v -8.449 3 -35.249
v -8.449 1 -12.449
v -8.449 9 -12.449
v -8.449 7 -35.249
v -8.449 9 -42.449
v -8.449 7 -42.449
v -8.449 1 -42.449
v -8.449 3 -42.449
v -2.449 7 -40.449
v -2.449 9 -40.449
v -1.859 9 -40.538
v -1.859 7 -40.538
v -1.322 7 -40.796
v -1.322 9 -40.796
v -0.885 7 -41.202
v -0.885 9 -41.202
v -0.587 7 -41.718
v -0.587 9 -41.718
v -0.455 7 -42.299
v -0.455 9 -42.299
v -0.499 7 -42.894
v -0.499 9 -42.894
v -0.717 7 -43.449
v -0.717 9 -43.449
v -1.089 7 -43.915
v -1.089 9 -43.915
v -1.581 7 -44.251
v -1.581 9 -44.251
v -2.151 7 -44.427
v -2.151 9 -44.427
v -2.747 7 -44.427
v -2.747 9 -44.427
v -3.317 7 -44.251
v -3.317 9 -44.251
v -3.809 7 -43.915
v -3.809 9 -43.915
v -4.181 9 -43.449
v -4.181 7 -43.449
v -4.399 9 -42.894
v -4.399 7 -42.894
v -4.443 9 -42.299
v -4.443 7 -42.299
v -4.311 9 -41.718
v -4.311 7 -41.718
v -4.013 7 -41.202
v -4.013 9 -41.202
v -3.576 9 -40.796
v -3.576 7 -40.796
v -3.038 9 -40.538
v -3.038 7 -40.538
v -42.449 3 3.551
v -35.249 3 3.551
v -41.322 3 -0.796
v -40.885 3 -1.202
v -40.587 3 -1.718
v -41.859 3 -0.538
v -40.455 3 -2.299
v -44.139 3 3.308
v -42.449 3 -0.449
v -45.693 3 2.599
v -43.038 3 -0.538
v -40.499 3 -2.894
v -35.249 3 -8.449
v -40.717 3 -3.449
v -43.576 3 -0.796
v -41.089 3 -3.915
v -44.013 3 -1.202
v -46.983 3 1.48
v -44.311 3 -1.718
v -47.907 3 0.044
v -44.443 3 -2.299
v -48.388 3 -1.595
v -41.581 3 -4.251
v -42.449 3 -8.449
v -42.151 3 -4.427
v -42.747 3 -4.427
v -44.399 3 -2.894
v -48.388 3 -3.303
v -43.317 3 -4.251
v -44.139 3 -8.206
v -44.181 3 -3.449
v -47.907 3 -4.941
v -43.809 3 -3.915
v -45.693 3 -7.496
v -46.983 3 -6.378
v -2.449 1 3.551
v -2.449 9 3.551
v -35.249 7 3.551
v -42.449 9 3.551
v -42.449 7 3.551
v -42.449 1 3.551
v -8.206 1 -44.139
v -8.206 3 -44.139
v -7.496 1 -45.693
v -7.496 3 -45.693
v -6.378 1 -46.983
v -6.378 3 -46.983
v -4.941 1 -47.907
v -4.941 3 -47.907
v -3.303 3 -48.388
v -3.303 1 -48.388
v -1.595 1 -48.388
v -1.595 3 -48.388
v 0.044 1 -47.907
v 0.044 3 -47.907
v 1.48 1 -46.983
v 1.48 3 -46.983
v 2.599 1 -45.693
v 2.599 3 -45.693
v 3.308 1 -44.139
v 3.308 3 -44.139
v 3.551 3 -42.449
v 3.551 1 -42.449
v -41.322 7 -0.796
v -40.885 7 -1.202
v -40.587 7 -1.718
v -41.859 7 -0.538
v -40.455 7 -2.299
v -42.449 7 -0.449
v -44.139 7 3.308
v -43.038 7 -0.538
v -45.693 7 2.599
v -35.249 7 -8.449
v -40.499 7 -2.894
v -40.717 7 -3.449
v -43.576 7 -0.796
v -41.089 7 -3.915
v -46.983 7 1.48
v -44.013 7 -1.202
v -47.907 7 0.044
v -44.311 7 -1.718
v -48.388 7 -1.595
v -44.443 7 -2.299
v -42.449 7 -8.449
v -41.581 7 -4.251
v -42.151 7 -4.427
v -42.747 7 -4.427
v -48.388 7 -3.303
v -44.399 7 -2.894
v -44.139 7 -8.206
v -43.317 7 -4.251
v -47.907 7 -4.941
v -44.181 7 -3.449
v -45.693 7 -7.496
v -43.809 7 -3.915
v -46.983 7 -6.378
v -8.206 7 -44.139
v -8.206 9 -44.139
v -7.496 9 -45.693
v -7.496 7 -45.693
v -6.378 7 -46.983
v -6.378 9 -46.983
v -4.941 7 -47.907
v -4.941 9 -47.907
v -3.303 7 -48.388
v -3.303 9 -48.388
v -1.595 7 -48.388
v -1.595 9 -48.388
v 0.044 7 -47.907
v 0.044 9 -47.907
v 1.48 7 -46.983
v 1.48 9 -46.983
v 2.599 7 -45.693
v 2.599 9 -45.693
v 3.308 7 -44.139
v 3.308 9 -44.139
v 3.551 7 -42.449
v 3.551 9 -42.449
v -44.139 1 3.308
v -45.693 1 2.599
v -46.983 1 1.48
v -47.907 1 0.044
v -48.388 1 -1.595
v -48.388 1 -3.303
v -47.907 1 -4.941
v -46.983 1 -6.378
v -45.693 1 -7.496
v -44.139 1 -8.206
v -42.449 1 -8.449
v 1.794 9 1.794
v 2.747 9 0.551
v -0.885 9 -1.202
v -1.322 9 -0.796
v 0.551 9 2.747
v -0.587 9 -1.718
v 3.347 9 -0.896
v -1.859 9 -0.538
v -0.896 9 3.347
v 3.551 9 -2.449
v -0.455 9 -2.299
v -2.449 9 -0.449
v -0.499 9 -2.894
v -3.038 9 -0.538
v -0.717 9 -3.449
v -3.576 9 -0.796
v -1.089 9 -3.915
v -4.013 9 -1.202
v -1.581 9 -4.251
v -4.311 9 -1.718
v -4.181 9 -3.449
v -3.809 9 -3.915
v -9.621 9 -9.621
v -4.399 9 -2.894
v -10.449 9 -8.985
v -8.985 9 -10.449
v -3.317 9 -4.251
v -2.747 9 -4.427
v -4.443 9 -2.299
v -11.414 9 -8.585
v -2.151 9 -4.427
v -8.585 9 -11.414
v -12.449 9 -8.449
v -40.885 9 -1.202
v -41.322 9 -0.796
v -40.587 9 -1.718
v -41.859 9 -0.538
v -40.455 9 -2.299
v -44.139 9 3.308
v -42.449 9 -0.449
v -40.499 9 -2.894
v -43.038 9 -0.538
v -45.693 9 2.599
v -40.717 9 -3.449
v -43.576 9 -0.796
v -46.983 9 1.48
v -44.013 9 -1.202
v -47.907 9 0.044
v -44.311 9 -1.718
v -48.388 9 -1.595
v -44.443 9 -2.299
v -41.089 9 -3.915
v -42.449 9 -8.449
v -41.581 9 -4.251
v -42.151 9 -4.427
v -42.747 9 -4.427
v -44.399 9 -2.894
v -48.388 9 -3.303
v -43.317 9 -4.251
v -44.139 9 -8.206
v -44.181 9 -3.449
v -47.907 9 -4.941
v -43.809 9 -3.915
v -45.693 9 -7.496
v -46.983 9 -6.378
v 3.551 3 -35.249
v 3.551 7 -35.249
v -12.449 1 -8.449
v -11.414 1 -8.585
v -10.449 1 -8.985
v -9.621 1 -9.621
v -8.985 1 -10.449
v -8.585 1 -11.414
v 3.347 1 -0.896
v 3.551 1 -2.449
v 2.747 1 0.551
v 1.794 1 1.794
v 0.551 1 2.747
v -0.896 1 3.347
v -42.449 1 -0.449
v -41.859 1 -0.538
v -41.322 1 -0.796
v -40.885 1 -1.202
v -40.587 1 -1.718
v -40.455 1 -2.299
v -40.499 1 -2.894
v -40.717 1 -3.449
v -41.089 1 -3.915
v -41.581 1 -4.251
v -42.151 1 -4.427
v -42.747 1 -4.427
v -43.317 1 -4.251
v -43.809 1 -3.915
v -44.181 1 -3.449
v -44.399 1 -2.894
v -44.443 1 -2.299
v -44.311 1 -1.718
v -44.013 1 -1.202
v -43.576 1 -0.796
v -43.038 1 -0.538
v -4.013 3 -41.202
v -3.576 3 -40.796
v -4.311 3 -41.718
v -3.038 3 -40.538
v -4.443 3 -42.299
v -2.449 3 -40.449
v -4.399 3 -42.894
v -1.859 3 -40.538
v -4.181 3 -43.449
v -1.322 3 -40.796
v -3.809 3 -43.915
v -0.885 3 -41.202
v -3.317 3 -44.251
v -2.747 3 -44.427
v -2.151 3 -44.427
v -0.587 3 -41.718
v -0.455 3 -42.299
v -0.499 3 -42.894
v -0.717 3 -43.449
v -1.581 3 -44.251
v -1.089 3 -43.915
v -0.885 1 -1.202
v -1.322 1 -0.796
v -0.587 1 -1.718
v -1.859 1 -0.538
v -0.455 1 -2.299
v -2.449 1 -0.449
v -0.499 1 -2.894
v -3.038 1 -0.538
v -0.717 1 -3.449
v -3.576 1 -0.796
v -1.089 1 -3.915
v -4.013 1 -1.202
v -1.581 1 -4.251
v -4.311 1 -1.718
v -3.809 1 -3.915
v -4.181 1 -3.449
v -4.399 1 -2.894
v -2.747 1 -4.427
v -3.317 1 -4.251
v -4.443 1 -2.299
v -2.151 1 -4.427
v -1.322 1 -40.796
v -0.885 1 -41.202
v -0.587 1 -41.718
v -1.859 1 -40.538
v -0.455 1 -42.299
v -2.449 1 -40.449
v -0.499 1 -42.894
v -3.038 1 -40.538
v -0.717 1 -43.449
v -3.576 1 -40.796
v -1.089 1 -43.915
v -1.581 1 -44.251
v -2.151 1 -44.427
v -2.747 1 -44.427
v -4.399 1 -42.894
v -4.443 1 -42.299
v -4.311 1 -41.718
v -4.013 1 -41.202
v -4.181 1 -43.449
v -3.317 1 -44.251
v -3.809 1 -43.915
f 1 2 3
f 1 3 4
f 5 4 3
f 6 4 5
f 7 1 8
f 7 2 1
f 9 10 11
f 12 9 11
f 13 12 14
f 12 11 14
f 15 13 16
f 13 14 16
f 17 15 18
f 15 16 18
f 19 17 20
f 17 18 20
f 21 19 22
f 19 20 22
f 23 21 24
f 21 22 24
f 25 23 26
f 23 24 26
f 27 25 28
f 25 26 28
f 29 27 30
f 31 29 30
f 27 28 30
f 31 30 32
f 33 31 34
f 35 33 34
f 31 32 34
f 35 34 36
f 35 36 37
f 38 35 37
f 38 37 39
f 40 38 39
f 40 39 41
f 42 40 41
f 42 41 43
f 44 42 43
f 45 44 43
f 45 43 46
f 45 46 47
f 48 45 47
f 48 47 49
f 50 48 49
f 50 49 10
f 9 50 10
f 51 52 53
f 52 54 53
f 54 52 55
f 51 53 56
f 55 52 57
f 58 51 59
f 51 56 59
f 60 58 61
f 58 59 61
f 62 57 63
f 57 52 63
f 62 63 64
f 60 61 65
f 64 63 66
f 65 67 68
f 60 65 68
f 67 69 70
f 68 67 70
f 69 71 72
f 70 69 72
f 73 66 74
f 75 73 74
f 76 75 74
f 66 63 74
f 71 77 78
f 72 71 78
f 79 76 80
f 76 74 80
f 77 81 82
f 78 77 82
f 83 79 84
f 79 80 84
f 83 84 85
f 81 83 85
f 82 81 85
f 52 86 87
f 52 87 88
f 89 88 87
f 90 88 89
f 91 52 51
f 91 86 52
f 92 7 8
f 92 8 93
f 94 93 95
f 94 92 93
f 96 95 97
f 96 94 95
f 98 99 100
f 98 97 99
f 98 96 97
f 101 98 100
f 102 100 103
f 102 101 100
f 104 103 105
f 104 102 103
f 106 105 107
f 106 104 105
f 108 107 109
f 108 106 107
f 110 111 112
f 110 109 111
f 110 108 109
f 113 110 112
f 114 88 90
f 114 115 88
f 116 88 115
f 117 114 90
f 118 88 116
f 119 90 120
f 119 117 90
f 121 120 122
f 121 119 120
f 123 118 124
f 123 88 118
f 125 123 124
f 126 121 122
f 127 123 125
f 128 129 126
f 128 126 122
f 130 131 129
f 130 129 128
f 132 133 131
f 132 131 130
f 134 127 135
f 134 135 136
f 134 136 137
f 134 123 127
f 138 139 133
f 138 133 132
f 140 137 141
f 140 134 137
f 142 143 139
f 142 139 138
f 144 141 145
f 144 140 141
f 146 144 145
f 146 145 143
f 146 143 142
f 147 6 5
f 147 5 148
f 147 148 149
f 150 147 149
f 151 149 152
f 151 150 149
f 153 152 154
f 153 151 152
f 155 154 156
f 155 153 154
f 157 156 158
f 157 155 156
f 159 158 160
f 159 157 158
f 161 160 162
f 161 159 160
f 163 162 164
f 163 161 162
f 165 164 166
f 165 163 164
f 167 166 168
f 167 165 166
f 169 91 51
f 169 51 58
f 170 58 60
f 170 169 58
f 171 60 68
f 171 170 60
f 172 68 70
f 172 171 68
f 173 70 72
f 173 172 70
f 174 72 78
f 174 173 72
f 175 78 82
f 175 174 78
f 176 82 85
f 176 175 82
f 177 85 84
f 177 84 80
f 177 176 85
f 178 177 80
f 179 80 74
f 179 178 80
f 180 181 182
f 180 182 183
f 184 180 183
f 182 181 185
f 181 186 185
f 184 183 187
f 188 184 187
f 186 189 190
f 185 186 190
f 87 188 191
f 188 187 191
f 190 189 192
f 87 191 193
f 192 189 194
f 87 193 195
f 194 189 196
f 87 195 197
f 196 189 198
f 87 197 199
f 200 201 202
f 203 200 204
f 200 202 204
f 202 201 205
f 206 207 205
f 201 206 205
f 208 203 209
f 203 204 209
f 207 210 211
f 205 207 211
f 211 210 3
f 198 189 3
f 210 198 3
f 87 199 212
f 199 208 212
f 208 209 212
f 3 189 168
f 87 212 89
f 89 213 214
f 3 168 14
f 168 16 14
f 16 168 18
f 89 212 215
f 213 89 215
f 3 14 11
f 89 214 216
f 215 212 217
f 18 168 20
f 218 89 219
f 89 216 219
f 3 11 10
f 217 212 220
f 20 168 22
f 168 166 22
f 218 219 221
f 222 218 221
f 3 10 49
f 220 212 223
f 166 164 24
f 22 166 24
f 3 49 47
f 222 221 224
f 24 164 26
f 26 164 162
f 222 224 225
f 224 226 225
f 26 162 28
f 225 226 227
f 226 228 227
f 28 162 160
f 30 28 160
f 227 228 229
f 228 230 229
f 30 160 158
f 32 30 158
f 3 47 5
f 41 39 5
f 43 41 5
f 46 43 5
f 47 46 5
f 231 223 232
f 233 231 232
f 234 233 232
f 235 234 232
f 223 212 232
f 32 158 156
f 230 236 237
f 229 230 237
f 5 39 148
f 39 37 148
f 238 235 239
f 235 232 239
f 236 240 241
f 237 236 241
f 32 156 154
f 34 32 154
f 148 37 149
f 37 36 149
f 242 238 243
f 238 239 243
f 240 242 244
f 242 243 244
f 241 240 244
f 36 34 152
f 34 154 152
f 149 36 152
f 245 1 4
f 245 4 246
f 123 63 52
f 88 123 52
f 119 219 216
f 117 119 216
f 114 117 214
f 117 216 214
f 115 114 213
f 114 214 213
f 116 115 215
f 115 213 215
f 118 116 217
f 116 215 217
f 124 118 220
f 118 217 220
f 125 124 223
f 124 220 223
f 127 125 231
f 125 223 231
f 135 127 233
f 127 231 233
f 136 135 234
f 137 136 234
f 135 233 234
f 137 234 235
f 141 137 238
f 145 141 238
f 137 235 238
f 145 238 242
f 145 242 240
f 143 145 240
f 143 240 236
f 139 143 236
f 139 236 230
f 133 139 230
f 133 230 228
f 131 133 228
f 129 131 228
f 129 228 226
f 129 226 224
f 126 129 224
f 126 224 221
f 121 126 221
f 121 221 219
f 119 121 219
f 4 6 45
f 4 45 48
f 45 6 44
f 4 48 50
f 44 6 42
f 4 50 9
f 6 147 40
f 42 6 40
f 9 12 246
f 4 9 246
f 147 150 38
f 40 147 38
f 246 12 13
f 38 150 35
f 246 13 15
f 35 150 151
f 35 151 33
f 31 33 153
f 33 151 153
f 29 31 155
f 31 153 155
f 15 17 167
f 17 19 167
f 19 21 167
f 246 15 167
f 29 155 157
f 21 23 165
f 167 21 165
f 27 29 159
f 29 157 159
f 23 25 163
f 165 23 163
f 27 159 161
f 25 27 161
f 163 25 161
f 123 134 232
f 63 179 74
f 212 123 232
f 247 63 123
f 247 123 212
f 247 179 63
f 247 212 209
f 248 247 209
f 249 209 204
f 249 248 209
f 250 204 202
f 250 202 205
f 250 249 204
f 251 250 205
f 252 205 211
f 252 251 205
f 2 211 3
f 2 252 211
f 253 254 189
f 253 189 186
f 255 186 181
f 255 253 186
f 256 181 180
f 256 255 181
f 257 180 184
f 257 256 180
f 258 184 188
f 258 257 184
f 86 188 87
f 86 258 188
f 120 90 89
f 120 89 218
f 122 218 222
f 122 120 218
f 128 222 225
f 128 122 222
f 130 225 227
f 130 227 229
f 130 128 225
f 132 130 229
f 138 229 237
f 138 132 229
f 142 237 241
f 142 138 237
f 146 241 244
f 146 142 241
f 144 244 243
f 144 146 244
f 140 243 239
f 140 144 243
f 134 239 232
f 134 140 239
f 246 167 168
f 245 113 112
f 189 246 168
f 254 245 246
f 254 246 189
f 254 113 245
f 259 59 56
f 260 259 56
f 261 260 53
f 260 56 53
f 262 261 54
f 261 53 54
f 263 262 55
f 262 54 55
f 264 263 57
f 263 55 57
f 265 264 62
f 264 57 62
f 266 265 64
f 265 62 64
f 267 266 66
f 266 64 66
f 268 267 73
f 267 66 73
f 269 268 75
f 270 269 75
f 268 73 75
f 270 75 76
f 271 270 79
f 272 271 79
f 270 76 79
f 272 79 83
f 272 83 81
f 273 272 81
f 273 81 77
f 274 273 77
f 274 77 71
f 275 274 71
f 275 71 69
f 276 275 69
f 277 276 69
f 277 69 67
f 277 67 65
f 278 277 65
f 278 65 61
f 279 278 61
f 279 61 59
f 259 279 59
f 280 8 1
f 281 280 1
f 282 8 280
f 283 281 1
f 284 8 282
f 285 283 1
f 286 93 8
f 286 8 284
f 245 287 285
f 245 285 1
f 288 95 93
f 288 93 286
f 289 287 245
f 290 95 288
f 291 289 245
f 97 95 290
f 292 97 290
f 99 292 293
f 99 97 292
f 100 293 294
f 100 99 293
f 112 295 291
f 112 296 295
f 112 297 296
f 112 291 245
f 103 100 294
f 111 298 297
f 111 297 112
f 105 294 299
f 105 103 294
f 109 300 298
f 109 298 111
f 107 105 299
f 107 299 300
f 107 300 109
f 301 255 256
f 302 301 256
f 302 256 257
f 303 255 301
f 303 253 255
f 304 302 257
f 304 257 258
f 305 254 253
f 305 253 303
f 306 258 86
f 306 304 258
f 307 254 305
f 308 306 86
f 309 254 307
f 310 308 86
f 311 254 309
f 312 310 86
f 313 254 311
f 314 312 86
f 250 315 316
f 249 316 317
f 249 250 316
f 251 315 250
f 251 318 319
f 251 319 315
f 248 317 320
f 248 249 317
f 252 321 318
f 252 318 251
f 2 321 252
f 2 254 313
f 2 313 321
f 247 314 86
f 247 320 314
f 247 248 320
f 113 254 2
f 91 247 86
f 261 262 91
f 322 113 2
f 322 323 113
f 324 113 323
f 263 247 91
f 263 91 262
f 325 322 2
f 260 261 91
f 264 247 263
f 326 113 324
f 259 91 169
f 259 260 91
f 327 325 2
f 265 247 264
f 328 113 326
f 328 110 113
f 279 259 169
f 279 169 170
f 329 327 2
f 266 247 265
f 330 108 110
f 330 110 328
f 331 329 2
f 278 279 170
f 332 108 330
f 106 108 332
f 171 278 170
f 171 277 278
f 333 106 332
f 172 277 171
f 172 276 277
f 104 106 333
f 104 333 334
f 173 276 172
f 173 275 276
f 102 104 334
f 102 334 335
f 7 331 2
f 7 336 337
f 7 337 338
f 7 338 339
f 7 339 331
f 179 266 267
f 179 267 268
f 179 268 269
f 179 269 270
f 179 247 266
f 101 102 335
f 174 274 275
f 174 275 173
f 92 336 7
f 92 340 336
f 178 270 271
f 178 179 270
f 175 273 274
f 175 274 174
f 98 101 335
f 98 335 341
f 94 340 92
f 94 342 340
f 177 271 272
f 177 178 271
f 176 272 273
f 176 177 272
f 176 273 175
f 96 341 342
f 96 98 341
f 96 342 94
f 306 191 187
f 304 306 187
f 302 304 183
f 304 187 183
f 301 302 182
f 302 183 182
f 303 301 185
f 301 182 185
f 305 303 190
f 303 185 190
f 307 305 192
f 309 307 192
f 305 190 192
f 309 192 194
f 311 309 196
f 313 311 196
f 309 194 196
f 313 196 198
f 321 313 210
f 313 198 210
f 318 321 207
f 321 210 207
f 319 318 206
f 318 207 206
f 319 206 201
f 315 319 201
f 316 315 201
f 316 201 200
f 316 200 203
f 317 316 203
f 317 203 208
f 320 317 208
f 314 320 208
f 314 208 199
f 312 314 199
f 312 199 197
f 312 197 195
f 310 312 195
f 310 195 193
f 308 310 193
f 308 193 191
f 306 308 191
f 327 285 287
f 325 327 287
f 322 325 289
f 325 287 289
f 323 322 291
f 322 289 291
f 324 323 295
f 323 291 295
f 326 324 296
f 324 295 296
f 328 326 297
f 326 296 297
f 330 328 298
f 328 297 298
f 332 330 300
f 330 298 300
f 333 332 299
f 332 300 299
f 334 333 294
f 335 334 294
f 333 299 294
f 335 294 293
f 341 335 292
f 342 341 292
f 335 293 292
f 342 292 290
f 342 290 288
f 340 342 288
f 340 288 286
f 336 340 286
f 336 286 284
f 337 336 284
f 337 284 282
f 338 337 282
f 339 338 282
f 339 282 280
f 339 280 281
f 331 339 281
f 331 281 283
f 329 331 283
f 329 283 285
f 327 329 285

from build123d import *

# Parameters (mm, degrees)
SKETCH1_R               = 2.4
BOSS_EXTRUDE1_DEPTH     = 10
CUT_EXTRUDE1_DEPTH      = 2.5
CUT_EXTRUDE1_DEPTH_BACK = 2.5
SKETCH2_R               = 2.4
CUT_EXTRUDE2_DEPTH      = 2.5
CUT_EXTRUDE2_DEPTH_BACK = 2.5
SKETCH3_R               = 2.4
SCALE1_SCALE            = 0.8
SKETCH4_R               = 2
CUT_EXTRUDE3_DEPTH      = 69.982589006


with BuildPart() as part:
    # Sketch1 → Boss-Extrude1 (new body)
    with BuildSketch(Plane(origin=(0, 0, 0), x_dir=(1, 0, 0), z_dir=(0, 1, 0))):
        with BuildLine():
            Line((-50, 7.5), (-12.5, 7.5))
            ThreePointArc((-12.5, 7.5), (-8.964466094, 8.964466094), (-7.5, 12.5))
            Line((-7.5, 12.5), (-7.5, 50))
            ThreePointArc((-7.5, 50), (0, 57.5), (7.5, 50))
            Line((7.5, 50), (7.5, 0))
            ThreePointArc((7.5, 0), (5.303300859, -5.303300859), (0, -7.5))
            Line((0, -7.5), (-50, -7.5))
            ThreePointArc((-50, -7.5), (-57.5, 0), (-50, 7.5))
        make_face()
        with Locations(Location((0, 0, 0), (0, 0, 270))):
            Circle(SKETCH1_R, mode=Mode.SUBTRACT)
        with Locations(Location((-50, 0, 0), (0, 0, 270))):
            Circle(SKETCH1_R, mode=Mode.SUBTRACT)
        with Locations(Location((0, 50, 0), (0, 0, 270))):
            Circle(SKETCH1_R, mode=Mode.SUBTRACT)
    extrude(amount=BOSS_EXTRUDE1_DEPTH)

    # Sketch2 → Cut-Extrude1 (cut, two sides: drawn at the far end of the back side and taken through both)
    with BuildSketch(Plane(origin=(0, 5, 0), x_dir=(1, 0, 0), z_dir=(0, 1, 0)).offset(-CUT_EXTRUDE1_DEPTH_BACK)):
        with BuildLine():
            Line((-50, 7.5), (-41, 7.5))
            Line((-41, 7.5), (-41, -7.5))
            Line((-41, -7.5), (-50, -7.5))
            ThreePointArc((-50, -7.5), (-57.5, 0), (-50, 7.5))
        make_face()
        with Locations(Location((-50, 0, 0), (0, 0, 270))):
            Circle(SKETCH2_R, mode=Mode.SUBTRACT)
    extrude(amount=CUT_EXTRUDE1_DEPTH + CUT_EXTRUDE1_DEPTH_BACK, mode=Mode.SUBTRACT)

    # Sketch3 → Cut-Extrude2 (cut, two sides: drawn at the far end of the back side and taken through both)
    with BuildSketch(Plane(origin=(0, 5, 0), x_dir=(1, 0, 0), z_dir=(0, 1, 0)).offset(-CUT_EXTRUDE2_DEPTH_BACK)):
        with BuildLine():
            Line((-7.5, 50), (-7.5, 41))
            Line((-7.5, 41), (7.5, 41))
            Line((7.5, 41), (7.5, 50))
            ThreePointArc((7.5, 50), (0, 57.5), (-7.5, 50))
        make_face()
        with Locations(Location((0, 50, 0), (0, 0, 270))):
            Circle(SKETCH3_R, mode=Mode.SUBTRACT)
    extrude(amount=CUT_EXTRUDE2_DEPTH + CUT_EXTRUDE2_DEPTH_BACK, mode=Mode.SUBTRACT)


with BuildPart() as part_1:
    # Scale1: scaled about (-12.244648703, 5, -12.244648703)
    add(part.part.scale(SCALE1_SCALE).moved(Location((-2.448929741, 1, -2.448929741))))

    # Sketch4 → Cut-Extrude3 (cut, through all)
    with BuildSketch(Plane(origin=(0, 9, 0), x_dir=(1, 0, 0), z_dir=(0, 1, 0))):
        with Locations(Location((-2.448929741, 42.448929741, 0), (0, 0, 270))):
            Circle(SKETCH4_R)
        with Locations(Location((-2.448929741, 2.448929741, 0), (0, 0, 270))):
            Circle(SKETCH4_R)
        with Locations(Location((-42.448929741, 2.448929741, 0), (0, 0, 270))):
            Circle(SKETCH4_R)
    extrude(amount=-CUT_EXTRUDE3_DEPTH, mode=Mode.SUBTRACT)


solid = part_1.part
